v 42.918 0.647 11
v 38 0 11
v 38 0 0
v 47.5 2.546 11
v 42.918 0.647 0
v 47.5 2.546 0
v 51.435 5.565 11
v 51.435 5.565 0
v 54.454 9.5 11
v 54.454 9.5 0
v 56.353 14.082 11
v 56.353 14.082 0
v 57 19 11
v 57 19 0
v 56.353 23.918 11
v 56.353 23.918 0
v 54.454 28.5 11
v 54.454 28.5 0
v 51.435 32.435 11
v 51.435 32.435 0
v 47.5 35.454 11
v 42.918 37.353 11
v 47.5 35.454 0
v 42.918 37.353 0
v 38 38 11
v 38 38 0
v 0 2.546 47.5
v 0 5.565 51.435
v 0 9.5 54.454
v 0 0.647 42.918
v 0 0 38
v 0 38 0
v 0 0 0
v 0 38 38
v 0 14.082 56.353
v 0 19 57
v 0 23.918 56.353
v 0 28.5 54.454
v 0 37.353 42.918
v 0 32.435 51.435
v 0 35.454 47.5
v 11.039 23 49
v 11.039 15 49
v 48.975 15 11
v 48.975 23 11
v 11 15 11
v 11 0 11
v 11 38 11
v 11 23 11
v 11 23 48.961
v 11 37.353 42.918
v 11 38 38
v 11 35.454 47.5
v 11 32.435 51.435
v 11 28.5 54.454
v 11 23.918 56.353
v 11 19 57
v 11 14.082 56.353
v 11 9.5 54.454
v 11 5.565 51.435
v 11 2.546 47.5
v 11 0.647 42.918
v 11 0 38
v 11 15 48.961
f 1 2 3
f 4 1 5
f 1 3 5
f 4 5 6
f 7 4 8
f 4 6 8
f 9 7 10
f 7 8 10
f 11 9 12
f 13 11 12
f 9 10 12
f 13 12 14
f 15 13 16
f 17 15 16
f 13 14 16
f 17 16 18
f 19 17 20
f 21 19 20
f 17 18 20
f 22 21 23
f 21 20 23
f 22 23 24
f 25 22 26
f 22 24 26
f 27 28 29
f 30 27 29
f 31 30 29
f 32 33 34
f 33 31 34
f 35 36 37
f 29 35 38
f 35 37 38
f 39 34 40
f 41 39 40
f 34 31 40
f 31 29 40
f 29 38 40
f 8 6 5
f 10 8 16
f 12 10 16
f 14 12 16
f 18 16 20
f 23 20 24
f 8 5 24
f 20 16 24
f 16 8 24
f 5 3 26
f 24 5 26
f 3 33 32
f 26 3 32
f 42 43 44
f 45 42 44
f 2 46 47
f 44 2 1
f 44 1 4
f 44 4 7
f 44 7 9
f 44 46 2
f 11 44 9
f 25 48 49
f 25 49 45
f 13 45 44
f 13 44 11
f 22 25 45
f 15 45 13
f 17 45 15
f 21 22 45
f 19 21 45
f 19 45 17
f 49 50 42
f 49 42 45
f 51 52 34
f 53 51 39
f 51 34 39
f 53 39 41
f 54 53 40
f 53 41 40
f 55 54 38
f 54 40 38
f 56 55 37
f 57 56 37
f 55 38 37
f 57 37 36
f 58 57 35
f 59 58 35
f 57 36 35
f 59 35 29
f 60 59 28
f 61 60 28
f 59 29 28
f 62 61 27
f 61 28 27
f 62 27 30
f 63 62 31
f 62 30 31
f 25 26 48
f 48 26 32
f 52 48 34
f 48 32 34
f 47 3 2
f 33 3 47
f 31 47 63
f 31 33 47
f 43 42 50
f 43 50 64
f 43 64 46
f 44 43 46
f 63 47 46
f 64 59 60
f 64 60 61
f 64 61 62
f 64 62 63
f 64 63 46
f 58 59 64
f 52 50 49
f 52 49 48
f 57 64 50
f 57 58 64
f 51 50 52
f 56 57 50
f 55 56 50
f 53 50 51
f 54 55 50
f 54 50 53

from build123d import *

# Parameters (mm, degrees)
F1_W     = 38
F1_H     = 38
F2_DEPTH = 11
F3_DEPTH = 11
F9_E8_W  = 53.7300702473
F9_E8_H  = 8


with BuildPart() as f2:
    # F1 (on Right) → F2 (new body)
    with BuildSketch(Plane.YZ):
        with Locations((19, 19)):
            Rectangle(F1_W, F1_H)
        with BuildLine():
            ThreePointArc((38, 38), (19, 57), (0, 38))
            Line((0, 38), (38, 38))
        make_face()
    extrude(amount=F2_DEPTH)

    # F0 (on Top) → F3 (join)
    with BuildSketch(Plane.XY):
        with BuildLine():
            Line((0, 38), (0, 0))
            Line((0, 0), (38, 0))
            ThreePointArc((38, 0), (57, 19), (38, 38))
            Line((38, 38), (0, 38))
        make_face()
    extrude(amount=F3_DEPTH)

    # F9_E8 (on explicit) → F10 (join, up to the next surface of F2)
    with BuildSketch(Plane(origin=(11.0387885943, 23, 49), x_dir=(0.7065170626, 0, -0.7076960083), z_dir=(-0.7076960083, 0, -0.7065170626))):
        with Locations((26.8650351237, 4)):
            Rectangle(F9_E8_W, F9_E8_H)
    extrude(until=Until.NEXT)


solid = f2.part
